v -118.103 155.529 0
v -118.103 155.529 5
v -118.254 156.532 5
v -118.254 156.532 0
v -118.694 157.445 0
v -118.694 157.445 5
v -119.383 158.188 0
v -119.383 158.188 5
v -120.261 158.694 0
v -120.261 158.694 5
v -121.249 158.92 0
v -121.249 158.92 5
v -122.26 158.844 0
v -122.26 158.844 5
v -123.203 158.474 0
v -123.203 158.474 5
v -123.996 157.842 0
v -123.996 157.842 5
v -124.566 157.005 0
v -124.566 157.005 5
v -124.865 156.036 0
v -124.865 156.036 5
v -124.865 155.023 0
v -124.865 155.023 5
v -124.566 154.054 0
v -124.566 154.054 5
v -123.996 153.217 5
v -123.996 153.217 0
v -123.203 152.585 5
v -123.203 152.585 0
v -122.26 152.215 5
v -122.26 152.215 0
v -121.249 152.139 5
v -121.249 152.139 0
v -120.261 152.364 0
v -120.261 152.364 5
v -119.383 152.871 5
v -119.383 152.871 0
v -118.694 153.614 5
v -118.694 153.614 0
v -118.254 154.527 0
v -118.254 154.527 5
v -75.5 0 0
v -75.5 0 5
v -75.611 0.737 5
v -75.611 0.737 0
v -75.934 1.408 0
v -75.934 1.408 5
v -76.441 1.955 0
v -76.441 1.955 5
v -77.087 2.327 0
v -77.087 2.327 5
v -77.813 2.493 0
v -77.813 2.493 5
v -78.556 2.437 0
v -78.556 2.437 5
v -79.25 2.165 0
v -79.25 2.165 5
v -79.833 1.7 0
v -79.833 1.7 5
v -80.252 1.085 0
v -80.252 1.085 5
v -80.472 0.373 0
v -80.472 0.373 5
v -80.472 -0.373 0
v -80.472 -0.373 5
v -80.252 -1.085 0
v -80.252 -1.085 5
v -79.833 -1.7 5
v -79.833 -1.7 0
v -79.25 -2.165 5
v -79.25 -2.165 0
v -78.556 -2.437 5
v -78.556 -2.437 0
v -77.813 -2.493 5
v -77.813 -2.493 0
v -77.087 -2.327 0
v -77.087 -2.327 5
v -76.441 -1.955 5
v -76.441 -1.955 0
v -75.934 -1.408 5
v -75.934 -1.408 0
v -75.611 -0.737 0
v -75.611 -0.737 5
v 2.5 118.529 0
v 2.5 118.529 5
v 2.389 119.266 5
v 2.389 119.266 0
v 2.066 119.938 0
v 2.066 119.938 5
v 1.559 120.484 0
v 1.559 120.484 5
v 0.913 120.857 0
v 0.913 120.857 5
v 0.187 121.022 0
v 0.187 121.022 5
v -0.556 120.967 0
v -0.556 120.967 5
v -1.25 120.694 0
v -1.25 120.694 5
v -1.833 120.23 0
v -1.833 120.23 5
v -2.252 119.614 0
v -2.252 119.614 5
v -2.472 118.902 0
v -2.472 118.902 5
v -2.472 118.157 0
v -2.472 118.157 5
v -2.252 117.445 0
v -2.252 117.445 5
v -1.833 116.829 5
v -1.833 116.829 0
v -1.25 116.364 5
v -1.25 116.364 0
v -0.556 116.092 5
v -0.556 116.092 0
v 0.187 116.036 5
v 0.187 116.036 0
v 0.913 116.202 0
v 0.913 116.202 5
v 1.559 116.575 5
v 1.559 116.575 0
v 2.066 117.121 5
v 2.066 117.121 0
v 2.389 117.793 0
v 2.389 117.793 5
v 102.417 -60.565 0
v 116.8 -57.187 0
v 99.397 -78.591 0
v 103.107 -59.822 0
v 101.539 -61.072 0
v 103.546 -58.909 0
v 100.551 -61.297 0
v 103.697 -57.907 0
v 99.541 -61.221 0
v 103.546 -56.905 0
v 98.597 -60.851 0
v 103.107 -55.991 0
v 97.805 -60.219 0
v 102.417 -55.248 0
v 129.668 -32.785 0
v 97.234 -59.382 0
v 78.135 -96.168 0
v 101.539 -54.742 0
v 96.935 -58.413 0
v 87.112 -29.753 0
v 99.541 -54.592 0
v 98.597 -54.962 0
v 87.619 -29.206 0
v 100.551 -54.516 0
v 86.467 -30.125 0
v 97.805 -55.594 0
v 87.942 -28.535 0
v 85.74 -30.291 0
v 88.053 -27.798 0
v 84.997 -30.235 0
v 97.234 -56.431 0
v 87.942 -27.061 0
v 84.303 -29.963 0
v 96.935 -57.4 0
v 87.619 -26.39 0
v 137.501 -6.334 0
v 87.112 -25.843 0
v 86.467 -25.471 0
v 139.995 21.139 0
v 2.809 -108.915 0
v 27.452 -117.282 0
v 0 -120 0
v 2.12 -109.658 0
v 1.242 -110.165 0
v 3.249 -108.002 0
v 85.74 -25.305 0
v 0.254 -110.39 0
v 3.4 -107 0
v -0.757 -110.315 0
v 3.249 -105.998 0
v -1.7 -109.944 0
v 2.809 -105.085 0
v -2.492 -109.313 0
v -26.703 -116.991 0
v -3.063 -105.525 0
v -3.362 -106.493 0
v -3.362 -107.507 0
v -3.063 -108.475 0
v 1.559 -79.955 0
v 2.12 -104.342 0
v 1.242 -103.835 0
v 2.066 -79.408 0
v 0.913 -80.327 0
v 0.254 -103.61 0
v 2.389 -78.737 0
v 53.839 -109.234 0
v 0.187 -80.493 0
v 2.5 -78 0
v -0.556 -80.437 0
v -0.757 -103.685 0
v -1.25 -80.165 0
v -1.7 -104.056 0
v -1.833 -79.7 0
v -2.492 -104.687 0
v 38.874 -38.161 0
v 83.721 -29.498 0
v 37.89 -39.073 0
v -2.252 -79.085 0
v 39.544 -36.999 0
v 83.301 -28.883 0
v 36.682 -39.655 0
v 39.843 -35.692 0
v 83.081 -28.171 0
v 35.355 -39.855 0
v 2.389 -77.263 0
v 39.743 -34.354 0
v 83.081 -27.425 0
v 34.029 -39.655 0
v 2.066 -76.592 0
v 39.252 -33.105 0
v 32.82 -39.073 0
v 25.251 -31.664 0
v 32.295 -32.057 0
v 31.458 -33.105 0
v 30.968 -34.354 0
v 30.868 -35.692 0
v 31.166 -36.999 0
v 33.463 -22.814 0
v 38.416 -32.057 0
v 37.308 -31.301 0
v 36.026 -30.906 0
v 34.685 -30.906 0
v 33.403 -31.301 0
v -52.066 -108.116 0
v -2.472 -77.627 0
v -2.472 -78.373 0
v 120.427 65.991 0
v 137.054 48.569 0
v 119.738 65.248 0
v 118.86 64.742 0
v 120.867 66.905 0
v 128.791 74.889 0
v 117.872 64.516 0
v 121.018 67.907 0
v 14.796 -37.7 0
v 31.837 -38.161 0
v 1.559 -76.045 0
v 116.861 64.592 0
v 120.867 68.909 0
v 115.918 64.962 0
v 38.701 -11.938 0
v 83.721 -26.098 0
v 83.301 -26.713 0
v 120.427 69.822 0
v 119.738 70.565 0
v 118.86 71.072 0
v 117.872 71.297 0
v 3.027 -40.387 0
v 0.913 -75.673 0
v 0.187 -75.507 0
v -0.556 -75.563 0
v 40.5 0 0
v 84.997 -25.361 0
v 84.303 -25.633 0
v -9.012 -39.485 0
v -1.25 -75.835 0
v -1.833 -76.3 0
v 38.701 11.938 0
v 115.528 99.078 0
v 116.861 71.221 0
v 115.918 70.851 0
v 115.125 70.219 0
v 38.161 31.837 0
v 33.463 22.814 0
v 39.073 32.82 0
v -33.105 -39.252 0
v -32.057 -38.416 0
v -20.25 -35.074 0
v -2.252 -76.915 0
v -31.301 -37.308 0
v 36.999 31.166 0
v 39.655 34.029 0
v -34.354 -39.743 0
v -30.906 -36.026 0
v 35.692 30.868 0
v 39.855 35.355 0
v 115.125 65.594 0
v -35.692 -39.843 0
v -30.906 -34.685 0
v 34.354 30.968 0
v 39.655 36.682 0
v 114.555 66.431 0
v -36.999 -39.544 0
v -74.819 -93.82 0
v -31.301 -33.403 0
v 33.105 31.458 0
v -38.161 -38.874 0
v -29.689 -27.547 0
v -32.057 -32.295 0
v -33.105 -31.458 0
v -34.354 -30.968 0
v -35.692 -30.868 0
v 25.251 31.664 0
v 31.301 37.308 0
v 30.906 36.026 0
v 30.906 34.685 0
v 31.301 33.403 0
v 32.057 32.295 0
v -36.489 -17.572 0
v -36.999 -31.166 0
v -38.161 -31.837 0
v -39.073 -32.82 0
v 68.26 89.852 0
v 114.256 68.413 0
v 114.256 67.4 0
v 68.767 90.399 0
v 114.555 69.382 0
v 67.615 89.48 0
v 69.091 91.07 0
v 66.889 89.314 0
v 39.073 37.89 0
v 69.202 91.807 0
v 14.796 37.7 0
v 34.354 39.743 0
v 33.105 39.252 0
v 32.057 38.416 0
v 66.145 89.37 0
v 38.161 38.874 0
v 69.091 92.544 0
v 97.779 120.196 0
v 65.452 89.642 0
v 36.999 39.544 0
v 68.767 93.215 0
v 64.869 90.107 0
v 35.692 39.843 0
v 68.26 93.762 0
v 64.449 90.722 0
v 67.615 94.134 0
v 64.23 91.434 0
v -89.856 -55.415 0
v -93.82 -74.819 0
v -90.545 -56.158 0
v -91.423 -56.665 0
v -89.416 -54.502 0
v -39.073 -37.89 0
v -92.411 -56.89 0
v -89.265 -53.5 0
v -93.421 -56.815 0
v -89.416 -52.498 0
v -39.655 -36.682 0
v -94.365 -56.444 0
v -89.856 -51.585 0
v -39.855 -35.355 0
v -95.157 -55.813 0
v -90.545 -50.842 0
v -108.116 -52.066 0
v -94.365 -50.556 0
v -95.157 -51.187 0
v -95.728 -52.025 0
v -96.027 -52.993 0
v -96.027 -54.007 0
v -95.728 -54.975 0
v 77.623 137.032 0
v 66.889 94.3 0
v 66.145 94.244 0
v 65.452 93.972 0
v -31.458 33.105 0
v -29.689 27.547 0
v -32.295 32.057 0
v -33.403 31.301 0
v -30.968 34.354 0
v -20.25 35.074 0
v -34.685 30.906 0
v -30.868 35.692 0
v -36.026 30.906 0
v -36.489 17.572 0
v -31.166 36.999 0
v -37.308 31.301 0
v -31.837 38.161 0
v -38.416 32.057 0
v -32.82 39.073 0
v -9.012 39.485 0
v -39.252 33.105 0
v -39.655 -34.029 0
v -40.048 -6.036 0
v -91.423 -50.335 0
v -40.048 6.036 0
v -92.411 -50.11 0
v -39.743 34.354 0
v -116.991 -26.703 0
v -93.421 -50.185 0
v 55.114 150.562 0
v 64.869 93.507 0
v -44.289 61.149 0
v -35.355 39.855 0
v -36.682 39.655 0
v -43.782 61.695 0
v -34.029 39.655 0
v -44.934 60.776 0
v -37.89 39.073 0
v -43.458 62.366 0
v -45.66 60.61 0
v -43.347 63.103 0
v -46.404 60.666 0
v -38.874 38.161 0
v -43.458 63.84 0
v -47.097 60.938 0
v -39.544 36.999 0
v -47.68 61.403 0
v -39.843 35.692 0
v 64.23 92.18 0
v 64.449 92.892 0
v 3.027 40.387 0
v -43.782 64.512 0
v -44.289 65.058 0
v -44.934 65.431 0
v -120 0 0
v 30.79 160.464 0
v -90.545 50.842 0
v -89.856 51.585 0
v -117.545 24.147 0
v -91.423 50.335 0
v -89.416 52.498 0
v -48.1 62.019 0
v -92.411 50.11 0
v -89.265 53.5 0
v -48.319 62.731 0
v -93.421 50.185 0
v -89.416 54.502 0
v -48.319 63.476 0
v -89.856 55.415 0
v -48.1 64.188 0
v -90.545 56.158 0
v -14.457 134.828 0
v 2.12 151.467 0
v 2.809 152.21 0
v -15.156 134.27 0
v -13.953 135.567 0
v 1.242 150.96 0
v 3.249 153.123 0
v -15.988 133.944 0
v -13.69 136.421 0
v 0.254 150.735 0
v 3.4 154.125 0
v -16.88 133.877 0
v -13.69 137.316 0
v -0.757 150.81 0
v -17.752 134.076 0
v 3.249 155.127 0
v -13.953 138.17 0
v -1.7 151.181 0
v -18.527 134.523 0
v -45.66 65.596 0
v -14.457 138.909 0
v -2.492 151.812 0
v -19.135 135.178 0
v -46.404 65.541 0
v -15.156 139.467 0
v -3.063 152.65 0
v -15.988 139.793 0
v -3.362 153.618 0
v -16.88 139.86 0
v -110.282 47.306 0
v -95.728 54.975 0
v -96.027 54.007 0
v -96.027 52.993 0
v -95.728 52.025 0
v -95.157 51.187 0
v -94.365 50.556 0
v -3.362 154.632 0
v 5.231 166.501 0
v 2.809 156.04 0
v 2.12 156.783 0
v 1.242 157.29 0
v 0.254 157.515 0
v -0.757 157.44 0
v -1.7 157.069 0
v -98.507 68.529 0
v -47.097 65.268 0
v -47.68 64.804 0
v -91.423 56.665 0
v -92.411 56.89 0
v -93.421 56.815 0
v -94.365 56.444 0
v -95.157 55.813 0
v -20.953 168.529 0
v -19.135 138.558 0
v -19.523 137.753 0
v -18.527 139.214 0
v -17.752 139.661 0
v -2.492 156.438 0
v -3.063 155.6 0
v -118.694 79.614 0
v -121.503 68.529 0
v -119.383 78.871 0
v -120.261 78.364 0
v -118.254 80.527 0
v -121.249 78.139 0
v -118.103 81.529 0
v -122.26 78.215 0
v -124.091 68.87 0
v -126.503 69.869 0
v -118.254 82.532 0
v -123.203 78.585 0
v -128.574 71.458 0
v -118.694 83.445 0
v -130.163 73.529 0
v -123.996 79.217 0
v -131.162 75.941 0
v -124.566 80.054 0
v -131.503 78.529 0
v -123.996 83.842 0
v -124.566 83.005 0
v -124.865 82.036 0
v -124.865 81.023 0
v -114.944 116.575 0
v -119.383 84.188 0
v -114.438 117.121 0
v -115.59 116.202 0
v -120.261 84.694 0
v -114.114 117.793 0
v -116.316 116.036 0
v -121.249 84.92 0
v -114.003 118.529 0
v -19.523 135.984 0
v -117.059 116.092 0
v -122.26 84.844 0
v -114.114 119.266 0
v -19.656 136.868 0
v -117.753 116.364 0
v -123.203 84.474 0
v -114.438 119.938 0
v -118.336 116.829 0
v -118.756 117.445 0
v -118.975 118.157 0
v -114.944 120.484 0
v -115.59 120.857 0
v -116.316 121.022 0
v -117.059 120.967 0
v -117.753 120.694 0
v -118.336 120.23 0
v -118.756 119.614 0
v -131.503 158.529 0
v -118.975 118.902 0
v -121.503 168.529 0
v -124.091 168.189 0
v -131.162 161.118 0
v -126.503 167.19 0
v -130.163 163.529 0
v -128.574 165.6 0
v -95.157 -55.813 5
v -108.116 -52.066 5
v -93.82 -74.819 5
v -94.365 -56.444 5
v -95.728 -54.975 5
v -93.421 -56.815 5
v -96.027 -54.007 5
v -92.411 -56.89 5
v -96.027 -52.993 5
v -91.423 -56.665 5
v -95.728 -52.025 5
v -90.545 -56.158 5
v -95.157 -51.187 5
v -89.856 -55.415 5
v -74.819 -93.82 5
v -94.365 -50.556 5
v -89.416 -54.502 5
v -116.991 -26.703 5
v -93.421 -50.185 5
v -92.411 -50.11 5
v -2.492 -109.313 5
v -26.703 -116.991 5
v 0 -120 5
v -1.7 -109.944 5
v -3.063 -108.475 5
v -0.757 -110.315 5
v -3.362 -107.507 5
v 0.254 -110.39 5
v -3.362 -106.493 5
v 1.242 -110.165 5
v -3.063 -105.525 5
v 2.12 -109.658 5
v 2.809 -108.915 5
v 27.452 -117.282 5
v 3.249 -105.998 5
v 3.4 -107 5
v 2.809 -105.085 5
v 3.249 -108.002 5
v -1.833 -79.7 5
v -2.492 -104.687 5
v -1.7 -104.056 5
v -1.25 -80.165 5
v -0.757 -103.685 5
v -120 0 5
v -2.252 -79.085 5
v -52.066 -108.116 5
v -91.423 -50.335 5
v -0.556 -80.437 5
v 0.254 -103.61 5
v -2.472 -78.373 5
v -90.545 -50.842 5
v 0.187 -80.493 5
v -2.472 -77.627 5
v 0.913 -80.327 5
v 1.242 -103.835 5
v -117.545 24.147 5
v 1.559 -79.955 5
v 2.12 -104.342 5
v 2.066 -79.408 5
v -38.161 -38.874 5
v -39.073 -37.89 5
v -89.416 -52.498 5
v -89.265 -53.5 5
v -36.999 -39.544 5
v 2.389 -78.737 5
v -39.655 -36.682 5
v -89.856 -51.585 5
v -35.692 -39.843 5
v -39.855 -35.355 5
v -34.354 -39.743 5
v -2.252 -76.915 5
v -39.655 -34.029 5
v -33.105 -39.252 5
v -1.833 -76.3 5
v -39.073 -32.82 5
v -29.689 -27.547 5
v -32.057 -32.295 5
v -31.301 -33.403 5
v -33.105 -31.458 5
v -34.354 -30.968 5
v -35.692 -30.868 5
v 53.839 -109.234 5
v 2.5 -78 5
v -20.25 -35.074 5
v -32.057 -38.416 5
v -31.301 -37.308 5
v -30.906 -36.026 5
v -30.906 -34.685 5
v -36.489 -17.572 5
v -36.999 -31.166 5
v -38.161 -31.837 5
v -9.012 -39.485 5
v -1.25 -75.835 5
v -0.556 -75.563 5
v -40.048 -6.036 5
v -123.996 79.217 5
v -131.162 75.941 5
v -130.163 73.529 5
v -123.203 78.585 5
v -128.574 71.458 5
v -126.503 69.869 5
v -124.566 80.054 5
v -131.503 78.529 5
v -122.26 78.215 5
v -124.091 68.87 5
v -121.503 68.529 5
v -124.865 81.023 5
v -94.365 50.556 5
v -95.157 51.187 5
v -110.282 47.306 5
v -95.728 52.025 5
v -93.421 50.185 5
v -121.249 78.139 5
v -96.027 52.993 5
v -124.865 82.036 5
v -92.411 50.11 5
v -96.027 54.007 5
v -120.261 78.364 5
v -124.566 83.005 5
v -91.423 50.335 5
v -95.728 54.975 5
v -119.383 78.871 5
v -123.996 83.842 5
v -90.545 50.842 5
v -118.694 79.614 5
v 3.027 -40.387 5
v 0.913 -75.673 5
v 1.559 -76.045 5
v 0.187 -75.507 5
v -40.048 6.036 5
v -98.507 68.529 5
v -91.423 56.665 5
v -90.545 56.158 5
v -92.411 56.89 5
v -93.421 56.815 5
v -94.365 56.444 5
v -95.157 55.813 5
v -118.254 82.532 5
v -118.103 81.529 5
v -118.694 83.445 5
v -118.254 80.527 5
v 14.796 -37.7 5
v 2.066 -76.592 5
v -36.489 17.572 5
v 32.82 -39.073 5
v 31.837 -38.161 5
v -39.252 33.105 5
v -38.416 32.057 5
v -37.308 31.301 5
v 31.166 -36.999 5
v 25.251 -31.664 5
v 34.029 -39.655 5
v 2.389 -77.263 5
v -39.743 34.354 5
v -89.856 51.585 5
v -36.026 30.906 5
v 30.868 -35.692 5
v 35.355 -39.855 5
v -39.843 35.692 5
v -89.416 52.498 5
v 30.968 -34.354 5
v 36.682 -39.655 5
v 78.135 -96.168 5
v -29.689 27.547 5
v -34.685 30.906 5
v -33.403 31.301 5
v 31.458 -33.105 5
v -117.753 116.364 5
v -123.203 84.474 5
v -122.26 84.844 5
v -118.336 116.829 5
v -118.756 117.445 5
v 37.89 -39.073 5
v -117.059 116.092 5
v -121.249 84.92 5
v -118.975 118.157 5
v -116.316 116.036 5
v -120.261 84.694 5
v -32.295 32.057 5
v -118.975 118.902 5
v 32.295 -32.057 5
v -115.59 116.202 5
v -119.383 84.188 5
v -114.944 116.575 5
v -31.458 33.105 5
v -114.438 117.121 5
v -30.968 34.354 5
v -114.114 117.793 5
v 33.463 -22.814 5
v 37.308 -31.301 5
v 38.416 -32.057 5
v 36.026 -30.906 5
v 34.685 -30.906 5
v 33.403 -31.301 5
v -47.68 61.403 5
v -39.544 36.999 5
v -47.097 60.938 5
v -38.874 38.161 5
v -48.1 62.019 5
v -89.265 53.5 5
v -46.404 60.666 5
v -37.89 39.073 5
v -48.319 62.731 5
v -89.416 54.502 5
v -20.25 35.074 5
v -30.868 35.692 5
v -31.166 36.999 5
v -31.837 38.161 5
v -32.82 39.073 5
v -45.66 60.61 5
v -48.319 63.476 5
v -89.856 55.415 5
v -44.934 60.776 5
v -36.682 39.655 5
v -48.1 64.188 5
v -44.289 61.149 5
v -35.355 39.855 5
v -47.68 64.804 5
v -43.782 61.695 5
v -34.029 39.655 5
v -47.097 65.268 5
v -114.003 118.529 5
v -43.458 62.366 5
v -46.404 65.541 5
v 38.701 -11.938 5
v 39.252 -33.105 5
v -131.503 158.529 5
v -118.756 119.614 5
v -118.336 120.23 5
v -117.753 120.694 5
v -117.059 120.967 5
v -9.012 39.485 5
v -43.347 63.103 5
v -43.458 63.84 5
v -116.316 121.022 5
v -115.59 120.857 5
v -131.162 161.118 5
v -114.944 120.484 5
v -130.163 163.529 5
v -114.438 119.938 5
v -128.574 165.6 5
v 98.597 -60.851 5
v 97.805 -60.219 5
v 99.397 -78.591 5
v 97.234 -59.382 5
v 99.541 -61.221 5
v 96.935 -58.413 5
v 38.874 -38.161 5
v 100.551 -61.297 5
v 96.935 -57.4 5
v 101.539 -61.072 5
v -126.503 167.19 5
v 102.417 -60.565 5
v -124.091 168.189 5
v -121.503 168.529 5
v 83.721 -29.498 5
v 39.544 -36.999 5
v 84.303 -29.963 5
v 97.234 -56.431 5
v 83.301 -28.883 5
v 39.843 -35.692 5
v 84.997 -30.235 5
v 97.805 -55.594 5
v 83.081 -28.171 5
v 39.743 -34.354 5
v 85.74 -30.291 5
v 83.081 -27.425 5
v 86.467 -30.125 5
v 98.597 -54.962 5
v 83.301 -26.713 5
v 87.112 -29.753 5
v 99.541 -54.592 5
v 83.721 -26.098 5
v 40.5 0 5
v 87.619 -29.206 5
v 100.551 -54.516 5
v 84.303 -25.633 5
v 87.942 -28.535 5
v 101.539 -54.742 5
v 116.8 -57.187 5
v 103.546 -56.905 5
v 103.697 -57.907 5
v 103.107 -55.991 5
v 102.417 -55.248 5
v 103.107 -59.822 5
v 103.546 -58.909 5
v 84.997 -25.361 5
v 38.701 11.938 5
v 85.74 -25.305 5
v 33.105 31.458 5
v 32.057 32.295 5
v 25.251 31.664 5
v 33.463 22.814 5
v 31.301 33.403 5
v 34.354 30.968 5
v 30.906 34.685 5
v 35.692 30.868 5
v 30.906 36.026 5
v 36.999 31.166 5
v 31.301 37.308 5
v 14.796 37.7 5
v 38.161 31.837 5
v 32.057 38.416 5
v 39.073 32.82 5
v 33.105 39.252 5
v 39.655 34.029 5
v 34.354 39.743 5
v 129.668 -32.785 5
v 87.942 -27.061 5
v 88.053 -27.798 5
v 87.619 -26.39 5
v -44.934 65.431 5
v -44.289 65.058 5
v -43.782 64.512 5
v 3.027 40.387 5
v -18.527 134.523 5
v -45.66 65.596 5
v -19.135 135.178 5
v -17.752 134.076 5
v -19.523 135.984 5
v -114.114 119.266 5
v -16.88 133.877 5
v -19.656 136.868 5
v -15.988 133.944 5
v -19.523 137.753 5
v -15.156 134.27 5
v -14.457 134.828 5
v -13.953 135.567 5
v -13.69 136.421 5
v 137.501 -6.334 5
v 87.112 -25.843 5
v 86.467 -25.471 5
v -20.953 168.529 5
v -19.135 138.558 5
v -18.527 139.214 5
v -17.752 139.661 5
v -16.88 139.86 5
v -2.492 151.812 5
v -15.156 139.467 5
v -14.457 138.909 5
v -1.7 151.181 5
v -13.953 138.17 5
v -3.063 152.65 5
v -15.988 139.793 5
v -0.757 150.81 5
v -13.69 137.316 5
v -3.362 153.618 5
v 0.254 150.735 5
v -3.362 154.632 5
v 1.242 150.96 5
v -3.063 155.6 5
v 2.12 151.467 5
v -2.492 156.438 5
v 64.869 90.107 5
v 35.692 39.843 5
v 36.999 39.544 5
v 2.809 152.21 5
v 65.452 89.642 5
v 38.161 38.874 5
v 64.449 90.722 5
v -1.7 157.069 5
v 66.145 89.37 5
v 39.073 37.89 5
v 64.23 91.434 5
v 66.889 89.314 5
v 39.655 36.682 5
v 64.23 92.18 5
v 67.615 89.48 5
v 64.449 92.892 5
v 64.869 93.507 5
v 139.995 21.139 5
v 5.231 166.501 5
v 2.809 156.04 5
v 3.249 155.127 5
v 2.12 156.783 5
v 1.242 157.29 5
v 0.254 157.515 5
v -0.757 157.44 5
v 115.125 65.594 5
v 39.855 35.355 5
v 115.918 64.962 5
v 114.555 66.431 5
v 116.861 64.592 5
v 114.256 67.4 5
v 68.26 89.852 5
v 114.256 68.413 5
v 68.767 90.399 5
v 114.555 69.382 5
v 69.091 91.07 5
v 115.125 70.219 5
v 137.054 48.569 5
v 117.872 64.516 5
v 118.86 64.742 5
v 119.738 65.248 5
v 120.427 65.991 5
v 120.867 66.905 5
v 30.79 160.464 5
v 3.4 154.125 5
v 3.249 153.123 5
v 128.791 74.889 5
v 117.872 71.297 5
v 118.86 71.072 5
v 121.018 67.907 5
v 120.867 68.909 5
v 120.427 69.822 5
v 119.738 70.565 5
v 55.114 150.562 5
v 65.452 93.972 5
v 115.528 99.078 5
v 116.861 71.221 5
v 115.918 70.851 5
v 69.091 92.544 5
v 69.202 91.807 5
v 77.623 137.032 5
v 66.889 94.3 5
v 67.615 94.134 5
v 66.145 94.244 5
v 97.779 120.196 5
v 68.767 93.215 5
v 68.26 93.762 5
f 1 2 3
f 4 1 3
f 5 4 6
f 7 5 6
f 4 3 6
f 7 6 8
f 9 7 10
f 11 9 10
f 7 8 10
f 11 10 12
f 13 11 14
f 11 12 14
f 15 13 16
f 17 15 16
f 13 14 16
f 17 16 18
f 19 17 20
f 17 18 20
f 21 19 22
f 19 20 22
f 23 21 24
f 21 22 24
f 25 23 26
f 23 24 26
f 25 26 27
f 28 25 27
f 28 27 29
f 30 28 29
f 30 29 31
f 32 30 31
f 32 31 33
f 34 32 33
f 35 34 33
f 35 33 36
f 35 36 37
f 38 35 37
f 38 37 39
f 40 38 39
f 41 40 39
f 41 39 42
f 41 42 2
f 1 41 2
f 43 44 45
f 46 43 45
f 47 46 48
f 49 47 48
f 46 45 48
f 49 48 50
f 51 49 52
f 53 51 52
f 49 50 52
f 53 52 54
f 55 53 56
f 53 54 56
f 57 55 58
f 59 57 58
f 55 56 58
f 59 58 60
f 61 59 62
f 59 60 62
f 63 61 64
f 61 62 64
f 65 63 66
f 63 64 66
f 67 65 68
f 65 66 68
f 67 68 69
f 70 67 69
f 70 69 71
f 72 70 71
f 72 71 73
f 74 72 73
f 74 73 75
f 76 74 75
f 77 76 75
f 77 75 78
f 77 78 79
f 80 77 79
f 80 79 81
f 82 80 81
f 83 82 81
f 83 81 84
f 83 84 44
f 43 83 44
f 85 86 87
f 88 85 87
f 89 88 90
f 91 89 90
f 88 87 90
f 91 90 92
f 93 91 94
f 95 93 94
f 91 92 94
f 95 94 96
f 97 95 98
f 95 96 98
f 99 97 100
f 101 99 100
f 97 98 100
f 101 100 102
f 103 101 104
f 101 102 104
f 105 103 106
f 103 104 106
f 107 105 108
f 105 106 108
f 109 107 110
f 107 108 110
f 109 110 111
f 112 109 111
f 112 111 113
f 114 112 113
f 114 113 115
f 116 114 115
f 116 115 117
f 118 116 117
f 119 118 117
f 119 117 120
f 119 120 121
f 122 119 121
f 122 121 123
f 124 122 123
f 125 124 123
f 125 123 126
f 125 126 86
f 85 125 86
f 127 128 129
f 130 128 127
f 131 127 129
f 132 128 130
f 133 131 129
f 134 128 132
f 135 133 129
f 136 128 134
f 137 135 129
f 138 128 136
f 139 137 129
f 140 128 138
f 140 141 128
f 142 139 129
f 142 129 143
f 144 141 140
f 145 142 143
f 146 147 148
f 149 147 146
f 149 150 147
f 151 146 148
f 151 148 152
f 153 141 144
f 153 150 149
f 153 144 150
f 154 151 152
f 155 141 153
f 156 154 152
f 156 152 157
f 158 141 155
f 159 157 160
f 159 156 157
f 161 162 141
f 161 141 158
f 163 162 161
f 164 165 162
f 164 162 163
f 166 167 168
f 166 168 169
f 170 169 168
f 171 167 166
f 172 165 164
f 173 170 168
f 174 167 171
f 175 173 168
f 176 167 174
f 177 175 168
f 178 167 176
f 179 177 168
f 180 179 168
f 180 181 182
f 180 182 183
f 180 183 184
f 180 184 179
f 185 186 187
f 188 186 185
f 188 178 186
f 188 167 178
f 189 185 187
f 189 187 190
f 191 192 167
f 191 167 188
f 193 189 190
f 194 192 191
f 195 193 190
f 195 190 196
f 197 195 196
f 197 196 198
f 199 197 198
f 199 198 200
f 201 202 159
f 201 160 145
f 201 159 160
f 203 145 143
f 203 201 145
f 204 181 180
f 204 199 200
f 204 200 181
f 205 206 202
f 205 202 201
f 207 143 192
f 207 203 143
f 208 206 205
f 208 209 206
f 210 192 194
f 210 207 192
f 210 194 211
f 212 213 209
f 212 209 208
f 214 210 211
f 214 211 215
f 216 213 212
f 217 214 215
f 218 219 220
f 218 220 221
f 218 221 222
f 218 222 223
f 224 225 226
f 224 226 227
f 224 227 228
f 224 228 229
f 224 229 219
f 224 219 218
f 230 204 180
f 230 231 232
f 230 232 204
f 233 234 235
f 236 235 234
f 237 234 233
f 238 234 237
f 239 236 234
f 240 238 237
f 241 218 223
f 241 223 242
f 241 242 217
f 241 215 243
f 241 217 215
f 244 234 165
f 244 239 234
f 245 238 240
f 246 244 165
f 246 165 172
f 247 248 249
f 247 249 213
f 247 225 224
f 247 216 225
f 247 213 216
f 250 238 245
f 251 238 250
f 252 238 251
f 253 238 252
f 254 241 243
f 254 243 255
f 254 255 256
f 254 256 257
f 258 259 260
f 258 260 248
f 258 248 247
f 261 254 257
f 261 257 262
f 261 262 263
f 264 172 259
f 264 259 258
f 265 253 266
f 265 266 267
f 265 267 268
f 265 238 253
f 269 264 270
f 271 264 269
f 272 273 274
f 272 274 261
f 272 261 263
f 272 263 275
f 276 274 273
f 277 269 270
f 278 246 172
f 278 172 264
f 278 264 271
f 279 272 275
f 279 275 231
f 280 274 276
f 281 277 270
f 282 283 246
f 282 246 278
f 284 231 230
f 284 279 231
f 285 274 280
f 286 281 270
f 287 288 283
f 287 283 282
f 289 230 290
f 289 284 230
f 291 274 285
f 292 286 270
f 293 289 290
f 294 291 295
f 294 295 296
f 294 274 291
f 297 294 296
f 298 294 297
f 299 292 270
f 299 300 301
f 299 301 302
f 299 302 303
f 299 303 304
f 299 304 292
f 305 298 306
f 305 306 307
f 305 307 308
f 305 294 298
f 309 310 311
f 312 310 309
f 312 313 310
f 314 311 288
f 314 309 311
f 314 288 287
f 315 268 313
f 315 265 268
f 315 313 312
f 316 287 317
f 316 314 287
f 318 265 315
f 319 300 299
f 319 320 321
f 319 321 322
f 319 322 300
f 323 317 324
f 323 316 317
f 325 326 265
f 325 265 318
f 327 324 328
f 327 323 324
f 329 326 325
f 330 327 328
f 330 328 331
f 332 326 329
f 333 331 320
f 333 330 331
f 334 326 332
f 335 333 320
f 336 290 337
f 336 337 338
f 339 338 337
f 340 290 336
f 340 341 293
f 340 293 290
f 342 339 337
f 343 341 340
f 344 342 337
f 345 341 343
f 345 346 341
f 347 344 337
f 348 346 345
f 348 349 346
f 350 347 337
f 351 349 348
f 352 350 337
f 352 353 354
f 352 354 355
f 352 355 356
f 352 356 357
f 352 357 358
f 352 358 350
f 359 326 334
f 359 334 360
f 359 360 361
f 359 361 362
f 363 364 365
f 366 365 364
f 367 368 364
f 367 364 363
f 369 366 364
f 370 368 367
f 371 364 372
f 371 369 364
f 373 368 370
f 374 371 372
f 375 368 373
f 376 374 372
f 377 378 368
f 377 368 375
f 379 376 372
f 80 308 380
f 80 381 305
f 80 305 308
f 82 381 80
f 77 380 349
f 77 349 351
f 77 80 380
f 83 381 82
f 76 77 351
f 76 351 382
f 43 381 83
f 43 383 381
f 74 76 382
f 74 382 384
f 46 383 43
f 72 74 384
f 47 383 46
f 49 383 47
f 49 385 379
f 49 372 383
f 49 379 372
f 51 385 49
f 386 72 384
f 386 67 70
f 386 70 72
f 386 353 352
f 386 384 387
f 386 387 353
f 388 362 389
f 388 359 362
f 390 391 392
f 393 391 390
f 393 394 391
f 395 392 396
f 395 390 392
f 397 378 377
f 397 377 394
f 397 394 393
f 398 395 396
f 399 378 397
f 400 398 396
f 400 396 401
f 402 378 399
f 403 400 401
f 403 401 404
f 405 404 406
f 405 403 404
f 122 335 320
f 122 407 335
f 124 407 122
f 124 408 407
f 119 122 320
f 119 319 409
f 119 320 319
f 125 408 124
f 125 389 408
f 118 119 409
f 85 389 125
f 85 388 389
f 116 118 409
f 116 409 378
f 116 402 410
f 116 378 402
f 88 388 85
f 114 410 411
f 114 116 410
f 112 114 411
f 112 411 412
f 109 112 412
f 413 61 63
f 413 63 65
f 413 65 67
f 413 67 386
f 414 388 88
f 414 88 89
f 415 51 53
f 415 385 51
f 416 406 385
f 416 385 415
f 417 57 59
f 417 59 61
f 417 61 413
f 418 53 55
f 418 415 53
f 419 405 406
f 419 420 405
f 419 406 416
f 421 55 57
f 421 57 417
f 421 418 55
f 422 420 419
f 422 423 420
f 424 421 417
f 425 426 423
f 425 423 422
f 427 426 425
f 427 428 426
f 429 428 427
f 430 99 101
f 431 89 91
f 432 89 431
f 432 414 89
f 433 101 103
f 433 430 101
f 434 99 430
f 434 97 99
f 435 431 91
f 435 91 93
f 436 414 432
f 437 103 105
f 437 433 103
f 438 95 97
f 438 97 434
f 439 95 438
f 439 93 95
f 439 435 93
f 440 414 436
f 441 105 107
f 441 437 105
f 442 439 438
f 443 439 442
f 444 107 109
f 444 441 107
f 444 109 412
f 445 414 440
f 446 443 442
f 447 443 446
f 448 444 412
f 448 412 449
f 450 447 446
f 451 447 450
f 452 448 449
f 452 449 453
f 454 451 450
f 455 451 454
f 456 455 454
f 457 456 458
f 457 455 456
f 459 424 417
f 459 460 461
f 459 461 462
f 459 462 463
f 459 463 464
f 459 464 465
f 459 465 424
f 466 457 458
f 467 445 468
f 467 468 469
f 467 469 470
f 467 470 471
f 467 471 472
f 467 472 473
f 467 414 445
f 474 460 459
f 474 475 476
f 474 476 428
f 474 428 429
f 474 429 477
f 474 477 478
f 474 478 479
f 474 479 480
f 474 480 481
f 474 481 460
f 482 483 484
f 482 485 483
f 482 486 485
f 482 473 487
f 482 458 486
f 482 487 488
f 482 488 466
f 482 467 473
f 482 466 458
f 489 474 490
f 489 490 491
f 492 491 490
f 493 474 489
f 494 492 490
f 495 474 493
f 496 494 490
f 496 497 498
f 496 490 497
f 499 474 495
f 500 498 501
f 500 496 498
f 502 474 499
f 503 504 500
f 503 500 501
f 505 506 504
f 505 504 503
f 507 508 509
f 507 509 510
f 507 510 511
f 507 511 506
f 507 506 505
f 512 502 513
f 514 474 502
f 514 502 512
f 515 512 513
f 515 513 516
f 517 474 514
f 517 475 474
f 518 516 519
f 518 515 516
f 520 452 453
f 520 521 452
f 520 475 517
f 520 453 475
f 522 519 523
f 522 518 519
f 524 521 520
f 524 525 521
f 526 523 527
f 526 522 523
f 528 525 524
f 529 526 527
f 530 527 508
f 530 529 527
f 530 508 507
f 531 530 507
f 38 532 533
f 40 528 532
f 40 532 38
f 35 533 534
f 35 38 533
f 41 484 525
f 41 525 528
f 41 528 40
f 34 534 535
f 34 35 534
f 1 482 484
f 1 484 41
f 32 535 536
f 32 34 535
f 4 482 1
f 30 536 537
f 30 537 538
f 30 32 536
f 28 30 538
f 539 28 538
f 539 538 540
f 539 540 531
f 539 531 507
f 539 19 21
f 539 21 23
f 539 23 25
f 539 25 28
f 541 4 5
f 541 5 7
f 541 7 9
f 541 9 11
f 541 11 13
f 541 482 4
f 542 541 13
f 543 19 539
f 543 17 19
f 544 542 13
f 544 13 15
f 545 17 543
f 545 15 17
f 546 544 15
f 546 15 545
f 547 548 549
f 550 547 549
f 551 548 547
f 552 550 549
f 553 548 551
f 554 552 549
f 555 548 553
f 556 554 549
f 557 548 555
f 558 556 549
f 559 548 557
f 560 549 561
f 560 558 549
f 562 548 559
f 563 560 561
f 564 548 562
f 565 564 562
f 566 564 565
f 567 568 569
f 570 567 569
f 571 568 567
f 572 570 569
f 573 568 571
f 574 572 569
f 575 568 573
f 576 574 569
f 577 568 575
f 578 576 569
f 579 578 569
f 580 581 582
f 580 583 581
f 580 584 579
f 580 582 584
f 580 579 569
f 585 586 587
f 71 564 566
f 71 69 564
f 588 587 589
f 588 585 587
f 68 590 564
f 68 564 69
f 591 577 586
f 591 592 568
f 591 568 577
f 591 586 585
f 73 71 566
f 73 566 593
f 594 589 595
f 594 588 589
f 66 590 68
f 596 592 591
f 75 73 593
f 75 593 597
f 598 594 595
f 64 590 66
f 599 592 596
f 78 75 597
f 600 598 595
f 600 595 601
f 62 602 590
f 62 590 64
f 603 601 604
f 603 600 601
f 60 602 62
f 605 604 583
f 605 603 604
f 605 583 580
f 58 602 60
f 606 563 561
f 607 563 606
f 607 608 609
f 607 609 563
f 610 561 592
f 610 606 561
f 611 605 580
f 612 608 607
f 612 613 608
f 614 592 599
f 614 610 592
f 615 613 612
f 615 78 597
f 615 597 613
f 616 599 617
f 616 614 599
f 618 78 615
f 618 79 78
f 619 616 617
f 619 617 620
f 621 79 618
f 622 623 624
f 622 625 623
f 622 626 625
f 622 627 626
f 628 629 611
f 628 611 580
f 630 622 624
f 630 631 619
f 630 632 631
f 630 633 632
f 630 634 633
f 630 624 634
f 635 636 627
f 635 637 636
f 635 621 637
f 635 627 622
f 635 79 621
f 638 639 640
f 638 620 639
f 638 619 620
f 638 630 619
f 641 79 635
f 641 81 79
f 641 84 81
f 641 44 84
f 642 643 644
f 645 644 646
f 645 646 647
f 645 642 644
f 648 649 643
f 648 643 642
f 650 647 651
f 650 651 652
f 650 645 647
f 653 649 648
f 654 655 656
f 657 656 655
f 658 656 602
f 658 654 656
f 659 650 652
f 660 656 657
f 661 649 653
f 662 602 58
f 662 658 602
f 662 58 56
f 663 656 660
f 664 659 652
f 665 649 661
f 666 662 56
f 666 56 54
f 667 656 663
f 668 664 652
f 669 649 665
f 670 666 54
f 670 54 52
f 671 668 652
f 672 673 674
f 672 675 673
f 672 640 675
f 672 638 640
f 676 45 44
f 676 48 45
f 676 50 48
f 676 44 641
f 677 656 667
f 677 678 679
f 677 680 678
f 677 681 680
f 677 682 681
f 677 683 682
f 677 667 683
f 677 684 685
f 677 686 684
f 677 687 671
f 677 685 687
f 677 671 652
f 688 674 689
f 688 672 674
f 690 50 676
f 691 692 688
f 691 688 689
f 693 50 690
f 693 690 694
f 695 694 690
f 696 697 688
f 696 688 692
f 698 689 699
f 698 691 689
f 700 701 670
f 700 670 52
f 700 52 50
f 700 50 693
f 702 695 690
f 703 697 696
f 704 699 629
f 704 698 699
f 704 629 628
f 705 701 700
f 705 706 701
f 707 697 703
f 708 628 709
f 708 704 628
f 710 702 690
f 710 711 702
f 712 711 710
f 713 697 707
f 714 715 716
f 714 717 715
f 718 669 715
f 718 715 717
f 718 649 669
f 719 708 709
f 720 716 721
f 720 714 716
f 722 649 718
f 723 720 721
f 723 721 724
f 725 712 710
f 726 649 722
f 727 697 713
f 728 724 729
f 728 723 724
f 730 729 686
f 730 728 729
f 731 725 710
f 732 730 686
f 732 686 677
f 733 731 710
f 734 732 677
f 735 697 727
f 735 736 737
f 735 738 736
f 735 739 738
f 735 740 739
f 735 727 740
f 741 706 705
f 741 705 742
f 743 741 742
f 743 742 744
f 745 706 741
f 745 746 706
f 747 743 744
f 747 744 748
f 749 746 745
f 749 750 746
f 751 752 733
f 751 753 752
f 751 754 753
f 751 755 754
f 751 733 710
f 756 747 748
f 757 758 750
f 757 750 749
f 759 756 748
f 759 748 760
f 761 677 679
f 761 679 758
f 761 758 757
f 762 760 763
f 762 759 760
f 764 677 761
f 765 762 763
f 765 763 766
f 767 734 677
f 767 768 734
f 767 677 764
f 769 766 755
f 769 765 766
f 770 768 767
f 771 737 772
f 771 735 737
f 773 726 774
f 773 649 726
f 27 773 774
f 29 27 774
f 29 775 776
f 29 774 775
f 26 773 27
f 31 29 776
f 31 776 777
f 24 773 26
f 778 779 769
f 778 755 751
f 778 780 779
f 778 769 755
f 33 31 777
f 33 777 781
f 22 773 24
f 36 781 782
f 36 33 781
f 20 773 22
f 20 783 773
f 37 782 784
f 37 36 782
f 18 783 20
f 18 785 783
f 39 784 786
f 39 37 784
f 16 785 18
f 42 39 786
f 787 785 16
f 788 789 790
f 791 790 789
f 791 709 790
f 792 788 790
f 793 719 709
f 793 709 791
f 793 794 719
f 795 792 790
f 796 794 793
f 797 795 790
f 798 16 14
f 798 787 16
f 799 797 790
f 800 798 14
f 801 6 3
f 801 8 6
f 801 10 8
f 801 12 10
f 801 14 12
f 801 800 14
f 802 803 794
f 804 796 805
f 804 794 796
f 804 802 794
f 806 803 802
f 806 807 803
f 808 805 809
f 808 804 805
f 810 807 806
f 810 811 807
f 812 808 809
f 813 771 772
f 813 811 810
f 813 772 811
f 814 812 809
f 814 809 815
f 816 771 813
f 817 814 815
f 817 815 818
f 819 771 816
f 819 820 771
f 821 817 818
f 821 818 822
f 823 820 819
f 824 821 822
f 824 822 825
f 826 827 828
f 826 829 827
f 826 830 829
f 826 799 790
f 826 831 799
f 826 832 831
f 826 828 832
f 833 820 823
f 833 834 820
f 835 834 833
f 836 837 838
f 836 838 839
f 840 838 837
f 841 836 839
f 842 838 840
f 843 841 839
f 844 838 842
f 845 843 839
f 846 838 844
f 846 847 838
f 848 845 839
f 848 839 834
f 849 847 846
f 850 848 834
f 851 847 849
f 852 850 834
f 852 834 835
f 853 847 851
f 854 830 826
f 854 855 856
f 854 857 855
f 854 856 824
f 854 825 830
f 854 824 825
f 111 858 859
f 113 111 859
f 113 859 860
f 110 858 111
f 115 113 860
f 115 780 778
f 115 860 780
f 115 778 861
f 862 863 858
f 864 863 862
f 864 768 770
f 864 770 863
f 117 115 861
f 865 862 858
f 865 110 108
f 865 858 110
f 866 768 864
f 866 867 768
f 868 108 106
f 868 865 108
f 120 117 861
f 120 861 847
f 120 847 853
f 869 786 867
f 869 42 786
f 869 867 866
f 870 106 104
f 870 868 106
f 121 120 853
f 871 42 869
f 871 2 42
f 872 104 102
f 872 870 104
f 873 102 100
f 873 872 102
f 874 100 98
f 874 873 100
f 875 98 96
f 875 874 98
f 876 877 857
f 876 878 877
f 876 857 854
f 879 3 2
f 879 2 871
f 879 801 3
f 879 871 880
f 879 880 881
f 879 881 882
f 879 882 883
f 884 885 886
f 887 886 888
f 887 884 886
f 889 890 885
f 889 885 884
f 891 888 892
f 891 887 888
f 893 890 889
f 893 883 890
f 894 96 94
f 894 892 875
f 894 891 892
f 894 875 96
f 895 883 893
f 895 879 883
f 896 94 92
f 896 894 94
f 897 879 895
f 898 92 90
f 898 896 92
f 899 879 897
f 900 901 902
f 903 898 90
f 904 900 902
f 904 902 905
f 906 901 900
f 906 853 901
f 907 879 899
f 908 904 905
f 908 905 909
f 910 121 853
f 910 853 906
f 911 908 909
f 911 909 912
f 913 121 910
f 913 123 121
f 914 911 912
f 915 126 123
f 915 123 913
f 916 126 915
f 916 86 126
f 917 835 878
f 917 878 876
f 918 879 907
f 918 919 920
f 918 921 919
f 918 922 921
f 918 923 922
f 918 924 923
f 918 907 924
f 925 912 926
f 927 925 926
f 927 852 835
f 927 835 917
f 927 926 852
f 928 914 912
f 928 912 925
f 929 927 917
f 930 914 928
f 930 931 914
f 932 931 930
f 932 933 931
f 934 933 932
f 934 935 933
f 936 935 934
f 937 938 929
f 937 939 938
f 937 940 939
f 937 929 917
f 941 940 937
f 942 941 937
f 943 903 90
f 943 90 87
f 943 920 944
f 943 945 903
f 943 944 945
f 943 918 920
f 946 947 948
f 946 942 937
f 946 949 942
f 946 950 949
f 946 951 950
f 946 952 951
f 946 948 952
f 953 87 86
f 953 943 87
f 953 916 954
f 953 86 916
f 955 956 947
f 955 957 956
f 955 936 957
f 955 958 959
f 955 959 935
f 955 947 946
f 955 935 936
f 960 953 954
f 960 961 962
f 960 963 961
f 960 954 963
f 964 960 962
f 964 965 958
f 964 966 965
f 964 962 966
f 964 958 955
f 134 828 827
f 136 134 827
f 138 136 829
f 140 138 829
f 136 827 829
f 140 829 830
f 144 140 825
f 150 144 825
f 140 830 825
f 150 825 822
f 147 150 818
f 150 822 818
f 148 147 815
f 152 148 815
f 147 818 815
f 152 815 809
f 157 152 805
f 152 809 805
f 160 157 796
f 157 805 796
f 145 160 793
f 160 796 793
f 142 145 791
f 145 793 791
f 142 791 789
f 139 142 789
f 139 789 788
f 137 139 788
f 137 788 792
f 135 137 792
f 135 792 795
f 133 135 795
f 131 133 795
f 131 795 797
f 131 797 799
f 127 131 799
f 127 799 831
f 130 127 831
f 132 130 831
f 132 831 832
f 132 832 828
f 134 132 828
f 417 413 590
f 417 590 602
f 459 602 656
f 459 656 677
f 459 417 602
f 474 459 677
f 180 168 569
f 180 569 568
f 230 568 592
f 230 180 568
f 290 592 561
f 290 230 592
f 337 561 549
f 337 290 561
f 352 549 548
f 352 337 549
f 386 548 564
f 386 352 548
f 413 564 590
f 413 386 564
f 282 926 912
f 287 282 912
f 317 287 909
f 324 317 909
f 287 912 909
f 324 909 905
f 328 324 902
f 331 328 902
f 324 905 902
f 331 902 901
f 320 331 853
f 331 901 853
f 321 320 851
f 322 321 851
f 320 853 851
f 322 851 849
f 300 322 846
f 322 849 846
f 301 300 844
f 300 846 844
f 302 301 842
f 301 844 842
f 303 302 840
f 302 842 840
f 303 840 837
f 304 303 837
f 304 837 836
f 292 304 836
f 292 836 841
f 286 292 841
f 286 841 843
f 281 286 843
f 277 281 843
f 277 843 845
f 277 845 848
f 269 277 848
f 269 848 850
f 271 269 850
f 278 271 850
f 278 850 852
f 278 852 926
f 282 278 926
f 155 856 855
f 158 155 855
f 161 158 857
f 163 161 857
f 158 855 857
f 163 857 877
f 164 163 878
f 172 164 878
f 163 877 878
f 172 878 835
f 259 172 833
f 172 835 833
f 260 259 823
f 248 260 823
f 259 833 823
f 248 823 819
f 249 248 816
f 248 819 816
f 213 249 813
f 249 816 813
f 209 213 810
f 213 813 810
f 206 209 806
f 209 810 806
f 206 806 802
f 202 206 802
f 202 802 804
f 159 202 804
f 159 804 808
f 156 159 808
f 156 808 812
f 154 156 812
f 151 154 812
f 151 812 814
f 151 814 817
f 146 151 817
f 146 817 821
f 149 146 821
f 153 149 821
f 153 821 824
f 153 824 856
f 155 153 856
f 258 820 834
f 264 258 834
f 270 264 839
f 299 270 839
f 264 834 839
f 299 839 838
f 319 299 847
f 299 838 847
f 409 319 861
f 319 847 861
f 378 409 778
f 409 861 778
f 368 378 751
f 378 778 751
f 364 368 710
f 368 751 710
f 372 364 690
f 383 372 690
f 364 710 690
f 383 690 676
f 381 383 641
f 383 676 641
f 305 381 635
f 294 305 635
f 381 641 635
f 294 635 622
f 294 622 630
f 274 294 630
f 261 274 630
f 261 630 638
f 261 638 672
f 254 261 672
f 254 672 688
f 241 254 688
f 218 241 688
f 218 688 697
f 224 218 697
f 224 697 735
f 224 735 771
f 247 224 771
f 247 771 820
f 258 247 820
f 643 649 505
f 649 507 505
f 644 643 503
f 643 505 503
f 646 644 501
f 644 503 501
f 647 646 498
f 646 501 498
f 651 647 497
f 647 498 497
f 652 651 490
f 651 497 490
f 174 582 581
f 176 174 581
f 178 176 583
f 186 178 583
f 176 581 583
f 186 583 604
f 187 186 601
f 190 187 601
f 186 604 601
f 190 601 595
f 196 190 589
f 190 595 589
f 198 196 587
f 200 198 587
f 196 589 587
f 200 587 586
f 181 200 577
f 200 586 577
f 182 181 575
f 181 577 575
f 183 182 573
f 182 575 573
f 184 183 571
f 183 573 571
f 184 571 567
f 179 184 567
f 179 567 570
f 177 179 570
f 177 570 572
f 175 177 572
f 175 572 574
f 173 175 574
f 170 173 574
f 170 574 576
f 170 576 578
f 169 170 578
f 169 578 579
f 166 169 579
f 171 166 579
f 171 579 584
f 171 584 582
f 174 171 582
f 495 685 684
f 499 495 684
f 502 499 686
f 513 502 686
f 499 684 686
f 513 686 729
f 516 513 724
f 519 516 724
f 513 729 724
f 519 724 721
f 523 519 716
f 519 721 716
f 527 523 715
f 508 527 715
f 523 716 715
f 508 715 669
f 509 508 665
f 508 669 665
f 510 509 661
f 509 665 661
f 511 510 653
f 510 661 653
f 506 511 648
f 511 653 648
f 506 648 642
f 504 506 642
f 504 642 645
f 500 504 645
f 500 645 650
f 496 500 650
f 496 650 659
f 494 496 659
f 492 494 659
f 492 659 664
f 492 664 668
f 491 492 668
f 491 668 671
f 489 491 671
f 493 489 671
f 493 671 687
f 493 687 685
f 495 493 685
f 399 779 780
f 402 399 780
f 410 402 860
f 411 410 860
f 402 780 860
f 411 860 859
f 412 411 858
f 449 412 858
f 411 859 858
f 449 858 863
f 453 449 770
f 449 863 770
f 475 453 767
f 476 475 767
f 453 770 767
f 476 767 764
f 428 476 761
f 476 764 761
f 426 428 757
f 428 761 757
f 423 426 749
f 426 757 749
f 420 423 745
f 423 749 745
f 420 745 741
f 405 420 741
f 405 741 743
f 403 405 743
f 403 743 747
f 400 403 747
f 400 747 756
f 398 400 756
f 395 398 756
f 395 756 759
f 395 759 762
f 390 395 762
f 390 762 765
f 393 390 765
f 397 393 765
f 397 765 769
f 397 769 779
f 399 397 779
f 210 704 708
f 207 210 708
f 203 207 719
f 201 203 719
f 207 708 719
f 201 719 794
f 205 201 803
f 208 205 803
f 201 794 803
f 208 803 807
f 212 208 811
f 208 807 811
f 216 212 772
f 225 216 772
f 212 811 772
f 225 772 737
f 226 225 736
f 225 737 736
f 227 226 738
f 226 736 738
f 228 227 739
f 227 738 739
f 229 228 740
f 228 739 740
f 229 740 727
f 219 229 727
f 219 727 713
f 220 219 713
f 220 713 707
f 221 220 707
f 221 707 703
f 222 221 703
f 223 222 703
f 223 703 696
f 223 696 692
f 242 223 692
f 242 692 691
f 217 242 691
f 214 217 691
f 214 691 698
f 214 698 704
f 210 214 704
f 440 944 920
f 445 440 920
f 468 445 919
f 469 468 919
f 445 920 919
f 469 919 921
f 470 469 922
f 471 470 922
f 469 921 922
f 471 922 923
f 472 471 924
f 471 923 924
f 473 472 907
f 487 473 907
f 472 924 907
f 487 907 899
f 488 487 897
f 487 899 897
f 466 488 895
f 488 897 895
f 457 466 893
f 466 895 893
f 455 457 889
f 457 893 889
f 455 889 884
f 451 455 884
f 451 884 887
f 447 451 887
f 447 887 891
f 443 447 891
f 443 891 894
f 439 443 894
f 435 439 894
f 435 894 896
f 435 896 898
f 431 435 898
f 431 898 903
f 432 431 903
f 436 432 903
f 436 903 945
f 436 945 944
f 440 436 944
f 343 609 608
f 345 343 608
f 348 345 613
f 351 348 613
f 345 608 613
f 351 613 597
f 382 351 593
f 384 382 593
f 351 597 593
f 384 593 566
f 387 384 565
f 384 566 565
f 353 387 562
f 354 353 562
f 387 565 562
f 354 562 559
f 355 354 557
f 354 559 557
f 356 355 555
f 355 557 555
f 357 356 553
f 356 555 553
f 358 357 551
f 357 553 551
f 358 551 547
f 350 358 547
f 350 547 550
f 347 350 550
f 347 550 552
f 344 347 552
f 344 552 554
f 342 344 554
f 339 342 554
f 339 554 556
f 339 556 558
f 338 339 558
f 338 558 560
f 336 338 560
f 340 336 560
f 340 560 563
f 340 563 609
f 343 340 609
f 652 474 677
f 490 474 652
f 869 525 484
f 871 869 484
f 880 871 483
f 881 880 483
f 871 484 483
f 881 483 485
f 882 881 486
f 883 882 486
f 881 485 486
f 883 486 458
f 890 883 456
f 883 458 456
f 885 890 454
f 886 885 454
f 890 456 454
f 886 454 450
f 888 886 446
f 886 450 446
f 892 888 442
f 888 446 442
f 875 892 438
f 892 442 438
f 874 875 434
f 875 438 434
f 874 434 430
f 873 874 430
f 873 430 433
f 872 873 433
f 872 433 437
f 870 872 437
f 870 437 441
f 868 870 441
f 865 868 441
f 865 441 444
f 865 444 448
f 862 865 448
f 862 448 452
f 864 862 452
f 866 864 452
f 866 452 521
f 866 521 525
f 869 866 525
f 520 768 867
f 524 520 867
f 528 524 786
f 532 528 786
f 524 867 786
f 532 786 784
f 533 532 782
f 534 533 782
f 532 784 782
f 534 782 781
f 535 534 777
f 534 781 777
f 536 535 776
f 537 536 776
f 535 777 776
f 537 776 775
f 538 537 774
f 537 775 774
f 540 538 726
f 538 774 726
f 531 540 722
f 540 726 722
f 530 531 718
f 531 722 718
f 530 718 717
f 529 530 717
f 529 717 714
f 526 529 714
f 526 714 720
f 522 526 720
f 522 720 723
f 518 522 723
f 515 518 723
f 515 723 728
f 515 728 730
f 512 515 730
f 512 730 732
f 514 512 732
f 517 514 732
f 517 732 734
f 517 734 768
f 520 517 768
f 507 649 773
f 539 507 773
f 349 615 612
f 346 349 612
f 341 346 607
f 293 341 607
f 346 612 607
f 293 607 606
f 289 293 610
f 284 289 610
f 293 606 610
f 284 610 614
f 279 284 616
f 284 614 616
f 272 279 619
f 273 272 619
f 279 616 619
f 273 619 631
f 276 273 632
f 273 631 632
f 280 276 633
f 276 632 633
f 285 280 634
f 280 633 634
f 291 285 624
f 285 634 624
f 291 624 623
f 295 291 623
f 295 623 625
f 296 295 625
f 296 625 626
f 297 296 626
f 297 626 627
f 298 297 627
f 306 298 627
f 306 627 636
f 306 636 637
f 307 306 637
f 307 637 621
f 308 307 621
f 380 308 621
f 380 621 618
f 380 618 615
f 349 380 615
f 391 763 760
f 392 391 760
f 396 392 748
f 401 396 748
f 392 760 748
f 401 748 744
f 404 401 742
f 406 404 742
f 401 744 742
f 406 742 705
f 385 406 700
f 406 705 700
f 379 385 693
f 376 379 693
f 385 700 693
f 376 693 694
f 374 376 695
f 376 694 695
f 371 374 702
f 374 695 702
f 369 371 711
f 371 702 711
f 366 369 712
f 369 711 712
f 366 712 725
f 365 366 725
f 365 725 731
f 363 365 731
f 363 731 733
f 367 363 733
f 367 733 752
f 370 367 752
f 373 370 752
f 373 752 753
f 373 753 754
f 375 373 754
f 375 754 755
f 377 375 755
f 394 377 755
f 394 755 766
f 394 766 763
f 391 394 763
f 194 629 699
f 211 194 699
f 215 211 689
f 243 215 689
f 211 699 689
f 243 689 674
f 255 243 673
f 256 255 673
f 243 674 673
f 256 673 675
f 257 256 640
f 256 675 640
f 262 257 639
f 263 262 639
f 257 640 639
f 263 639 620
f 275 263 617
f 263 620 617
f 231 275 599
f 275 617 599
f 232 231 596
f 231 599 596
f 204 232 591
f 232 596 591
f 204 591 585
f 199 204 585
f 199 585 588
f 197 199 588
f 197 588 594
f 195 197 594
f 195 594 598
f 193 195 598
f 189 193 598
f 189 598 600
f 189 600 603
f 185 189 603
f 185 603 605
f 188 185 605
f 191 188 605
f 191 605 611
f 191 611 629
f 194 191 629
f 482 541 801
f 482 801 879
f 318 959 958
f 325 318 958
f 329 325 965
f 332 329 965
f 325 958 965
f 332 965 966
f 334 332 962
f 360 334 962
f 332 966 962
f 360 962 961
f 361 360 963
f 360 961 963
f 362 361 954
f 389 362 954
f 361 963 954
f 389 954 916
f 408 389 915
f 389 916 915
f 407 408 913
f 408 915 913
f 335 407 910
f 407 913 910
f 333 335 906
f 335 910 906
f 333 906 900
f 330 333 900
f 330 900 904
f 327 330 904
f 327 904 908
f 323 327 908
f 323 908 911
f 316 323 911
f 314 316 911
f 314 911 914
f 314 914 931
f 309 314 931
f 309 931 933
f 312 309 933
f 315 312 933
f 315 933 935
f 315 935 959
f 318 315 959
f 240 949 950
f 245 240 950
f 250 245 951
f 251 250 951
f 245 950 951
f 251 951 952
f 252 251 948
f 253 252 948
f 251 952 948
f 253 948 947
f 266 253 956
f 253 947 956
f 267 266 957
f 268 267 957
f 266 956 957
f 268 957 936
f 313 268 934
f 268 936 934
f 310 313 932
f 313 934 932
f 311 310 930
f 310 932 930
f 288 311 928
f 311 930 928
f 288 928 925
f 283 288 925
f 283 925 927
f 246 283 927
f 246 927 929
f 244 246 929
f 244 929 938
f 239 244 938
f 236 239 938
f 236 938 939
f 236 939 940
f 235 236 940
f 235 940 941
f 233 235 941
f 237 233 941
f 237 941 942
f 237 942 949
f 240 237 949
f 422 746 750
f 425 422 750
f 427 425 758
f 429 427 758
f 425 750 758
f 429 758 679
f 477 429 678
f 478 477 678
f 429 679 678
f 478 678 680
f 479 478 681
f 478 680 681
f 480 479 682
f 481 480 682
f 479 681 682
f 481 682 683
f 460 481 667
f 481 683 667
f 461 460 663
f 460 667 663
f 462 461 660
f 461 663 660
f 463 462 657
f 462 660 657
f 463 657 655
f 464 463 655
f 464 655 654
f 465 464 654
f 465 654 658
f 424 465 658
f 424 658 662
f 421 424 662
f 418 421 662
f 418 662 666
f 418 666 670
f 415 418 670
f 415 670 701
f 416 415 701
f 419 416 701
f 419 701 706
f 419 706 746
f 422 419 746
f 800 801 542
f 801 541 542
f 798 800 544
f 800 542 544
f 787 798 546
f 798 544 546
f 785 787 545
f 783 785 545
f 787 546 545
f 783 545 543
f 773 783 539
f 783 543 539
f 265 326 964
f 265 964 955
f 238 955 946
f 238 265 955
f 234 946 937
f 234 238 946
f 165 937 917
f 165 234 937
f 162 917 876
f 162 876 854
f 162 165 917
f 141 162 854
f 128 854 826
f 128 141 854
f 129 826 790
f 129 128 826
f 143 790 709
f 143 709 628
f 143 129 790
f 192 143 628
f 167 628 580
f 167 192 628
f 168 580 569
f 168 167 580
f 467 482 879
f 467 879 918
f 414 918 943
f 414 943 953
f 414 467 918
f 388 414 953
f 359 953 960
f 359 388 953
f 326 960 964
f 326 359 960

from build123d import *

# Parameters (mm, degrees)
BOSS_EXTRU_1_DEPTH           = 5
ESQUISSE11_R                 = 4.5
ENL_V_MAT_EXTRU_7_DEPTH      = 13
ENL_V_MAT_EXTRU_5_DEPTH      = 0.2
ESQUISSE2_R                  = 40.5
ENL_V_MAT_EXTRU_1_DEPTH      = 10
ESQUISSE3_R                  = 3
ENL_V_MAT_EXTRU_2_DEPTH      = 6
ESQUISSE10_R                 = 3.4
ENL_V_MAT_EXTRU_6_DEPTH      = 13
R_P_TITION_CIRCULAIRE1_COUNT = 4
BOSS_EXTRU_3_DEPTH           = 0.2
ESQUISSE26_W                 = 15
ESQUISSE26_H                 = 100
ENL_V_MAT_EXTRU_14_DEPTH     = 10
CONG_2_R                     = 10
ESQUISSE27_R                 = 2.5
ENL_V_MAT_EXTRU_15_DEPTH     = 10


with BuildPart() as part:
    # Esquisse1 → Boss.-Extru.1 (new body)
    with BuildSketch(Plane.XY):
        with BuildLine():
            Line((-98.507460241, 68.529411765), (-146.503153147, 68.529411765))
            Line((-146.503153147, 68.529411765), (-146.503153147, 168.529411765))
            Line((-146.503153147, 168.529411765), (-20.952657131, 168.529411765))
            ThreePointArc((-20.952657131, 168.529411765), (43.143624613, 155.983108662), (97.779066609, 120.196078431))
            ThreePointArc((97.779066609, 120.196078431), (129.667750386, -32.7851732), (0, -120))
            ThreePointArc((0, -120), (-84.852813742, -84.852813742), (-120, 0))
            ThreePointArc((-120, 0), (-114.500862942, 35.910338143), (-98.507460241, 68.529411765))
        make_face()
    extrude(amount=BOSS_EXTRU_1_DEPTH)

    # Esquisse11 → Enlèv. mat.-Extru.7 (cut)
    with BuildSketch(Plane.XY.offset(5)):
        with Locations((35.355339059, 35.355339059)):
            Circle(ESQUISSE11_R)
    enl_v_mat_extru_7 = extrude(amount=-ENL_V_MAT_EXTRU_7_DEPTH, mode=Mode.SUBTRACT)

    # Esquisse8 → Enlèv. mat.-Extru.5 (cut)
    with BuildSketch(Plane.XY.offset(5)):
        with BuildLine():
            Line((-148.503153147, 150.529411765), (-20.952657131, 150.529411765))
            ThreePointArc((-20.952657131, 150.529411765), (36.356959487, 139.311540755), (85.207472331, 107.31372549))
            ThreePointArc((85.207472331, 107.31372549), (112.996182479, -25.998508075), (0, -102))
            ThreePointArc((0, -102), (-98.056106388, -28.08914381), (-54.006119095, 86.529411765))
            Line((-54.006119095, 86.529411765), (-148.503153147, 86.529411765))
            Line((-148.503153147, 86.529411765), (-148.503153147, 150.529411765))
        make_face()
        with BuildLine():
            Line((-46.503153147, 88.529411765), (-146.503153147, 88.529411765))
            Line((-146.503153147, 88.529411765), (-146.503153147, 148.529411765))
            Line((-146.503153147, 148.529411765), (-20.952657131, 148.529411765))
            ThreePointArc((-20.952657131, 148.529411765), (35.602885584, 137.459144321), (83.810628522, 105.882352941))
            ThreePointArc((83.810628522, 105.882352941), (111.143786045, -25.244434172), (0, -100))
            ThreePointArc((0, -100), (-97.090012814, -23.948474101), (-46.503153147, 88.529411765))
        make_face(mode=Mode.SUBTRACT)
    extrude(amount=-ENL_V_MAT_EXTRU_5_DEPTH, mode=Mode.SUBTRACT)

    # Esquisse2 → Enlèv. mat.-Extru.1 (cut)
    with BuildSketch(Plane.XY.offset(5)):
        Circle(ESQUISSE2_R)
    extrude(amount=-ENL_V_MAT_EXTRU_1_DEPTH, mode=Mode.SUBTRACT)

    # Esquisse3 → Enlèv. mat.-Extru.2 (cut, through all)
    with BuildSketch(Plane(origin=(0, 0, 0), x_dir=(-1, 0, 0), z_dir=(0, 0, -1))):
        with Locations((16.656037964, 136.868437771)):
            Circle(ESQUISSE3_R)
    extrude(amount=-ENL_V_MAT_EXTRU_2_DEPTH, mode=Mode.SUBTRACT)

    # Esquisse10 → Enlèv. mat.-Extru.6 (cut)
    with BuildSketch(Plane.XY.offset(5)):
        with Locations((-121.503153147, 155.529411765)):
            Circle(ESQUISSE10_R)
        with Locations((117.617814583, 67.906676911)):
            Circle(ESQUISSE10_R)
        with Locations((100.297306508, -57.906676911)):
            Circle(ESQUISSE10_R)
        with Locations((0, -107)):
            Circle(ESQUISSE10_R)
        with Locations((-92.664718205, -53.5)):
            Circle(ESQUISSE10_R)
        with Locations((-92.664718205, 53.5)):
            Circle(ESQUISSE10_R)
        with Locations((-121.503153147, 81.529411765)):
            Circle(ESQUISSE10_R)
        with Locations((0, 154.124997046)):
            Circle(ESQUISSE10_R)
    extrude(amount=-ENL_V_MAT_EXTRU_6_DEPTH, mode=Mode.SUBTRACT)

    # Répétition circulaire1: Enlèv. mat.-Extru.7 ×4 about axis
    r_p_tition_circulaire1_axis = Axis((0, 0, 0), (0, 0, 1))
    for i in range(1, R_P_TITION_CIRCULAIRE1_COUNT):
        add(enl_v_mat_extru_7.rotate(r_p_tition_circulaire1_axis, i * 360 / R_P_TITION_CIRCULAIRE1_COUNT), mode=Mode.SUBTRACT)

    # Esquisse24 → Boss.-Extru.3 (add)
    with BuildSketch(Plane.XY.offset(5)):
        with BuildLine():
            Line((-146.503153147, 150.529411765), (-146.503153147, 148.529411765))
            Line((-146.503153147, 148.529411765), (-20.952657131, 148.529411765))
            ThreePointArc((-20.952657131, 148.529411765), (35.602885584, 137.459144321), (83.810628522, 105.882352941))
            ThreePointArc((83.810628522, 105.882352941), (111.143786045, -25.244434172), (0, -100))
            ThreePointArc((0, -100), (-97.090012814, -23.948474101), (-46.503153147, 88.529411765))
            Line((-46.503153147, 88.529411765), (-146.503153147, 88.529411765))
            Line((-146.503153147, 88.529411765), (-146.503153147, 86.529411765))
            Line((-146.503153147, 86.529411765), (-54.006119095, 86.529411765))
            ThreePointArc((-54.006119095, 86.529411765), (-98.056106388, -28.08914381), (0, -102))
            ThreePointArc((0, -102), (112.996182479, -25.998508075), (85.207472331, 107.31372549))
            ThreePointArc((85.207472331, 107.31372549), (36.356959487, 139.311540755), (-20.952657131, 150.529411765))
            Line((-20.952657131, 150.529411765), (-146.503153147, 150.529411765))
        make_face()
    extrude(amount=-BOSS_EXTRU_3_DEPTH)

    # Esquisse26 → Enlèv. mat.-Extru.14 (cut)
    with BuildSketch(Plane.XY.offset(5)):
        with Locations((-139.003153147, 118.529411765)):
            Rectangle(ESQUISSE26_W, ESQUISSE26_H)
    extrude(amount=-ENL_V_MAT_EXTRU_14_DEPTH, mode=Mode.SUBTRACT)

    # Congé2
    cong_2_edges = [part.edges().sort_by_distance(p)[0] for p in [
        (-131.503153147, 168.529411765, 2.5),
        (-131.503153147, 68.529411765, 2.5),
    ]]
    fillet(cong_2_edges, radius=CONG_2_R)

    # Esquisse27 → Enlèv. mat.-Extru.15 (cut)
    with BuildSketch(Plane.XY.offset(5)):
        with Locations((-116.503153147, 118.529411765)):
            Circle(ESQUISSE27_R)
        with Locations((0, 118.529411765)):
            Circle(ESQUISSE27_R)
        with Locations((66.701706035, 91.807022251)):
            Circle(ESQUISSE27_R)
        with Locations((85.55324371, -27.797933958)):
            Circle(ESQUISSE27_R)
        with Locations((0, -78)):
            Circle(ESQUISSE27_R)
        with Locations((-45.847249679, 63.103325561)):
            Circle(ESQUISSE27_R)
        with Locations((-78, 0)):
            Circle(ESQUISSE27_R)
    extrude(amount=-ENL_V_MAT_EXTRU_15_DEPTH, mode=Mode.SUBTRACT)


solid = part.part
